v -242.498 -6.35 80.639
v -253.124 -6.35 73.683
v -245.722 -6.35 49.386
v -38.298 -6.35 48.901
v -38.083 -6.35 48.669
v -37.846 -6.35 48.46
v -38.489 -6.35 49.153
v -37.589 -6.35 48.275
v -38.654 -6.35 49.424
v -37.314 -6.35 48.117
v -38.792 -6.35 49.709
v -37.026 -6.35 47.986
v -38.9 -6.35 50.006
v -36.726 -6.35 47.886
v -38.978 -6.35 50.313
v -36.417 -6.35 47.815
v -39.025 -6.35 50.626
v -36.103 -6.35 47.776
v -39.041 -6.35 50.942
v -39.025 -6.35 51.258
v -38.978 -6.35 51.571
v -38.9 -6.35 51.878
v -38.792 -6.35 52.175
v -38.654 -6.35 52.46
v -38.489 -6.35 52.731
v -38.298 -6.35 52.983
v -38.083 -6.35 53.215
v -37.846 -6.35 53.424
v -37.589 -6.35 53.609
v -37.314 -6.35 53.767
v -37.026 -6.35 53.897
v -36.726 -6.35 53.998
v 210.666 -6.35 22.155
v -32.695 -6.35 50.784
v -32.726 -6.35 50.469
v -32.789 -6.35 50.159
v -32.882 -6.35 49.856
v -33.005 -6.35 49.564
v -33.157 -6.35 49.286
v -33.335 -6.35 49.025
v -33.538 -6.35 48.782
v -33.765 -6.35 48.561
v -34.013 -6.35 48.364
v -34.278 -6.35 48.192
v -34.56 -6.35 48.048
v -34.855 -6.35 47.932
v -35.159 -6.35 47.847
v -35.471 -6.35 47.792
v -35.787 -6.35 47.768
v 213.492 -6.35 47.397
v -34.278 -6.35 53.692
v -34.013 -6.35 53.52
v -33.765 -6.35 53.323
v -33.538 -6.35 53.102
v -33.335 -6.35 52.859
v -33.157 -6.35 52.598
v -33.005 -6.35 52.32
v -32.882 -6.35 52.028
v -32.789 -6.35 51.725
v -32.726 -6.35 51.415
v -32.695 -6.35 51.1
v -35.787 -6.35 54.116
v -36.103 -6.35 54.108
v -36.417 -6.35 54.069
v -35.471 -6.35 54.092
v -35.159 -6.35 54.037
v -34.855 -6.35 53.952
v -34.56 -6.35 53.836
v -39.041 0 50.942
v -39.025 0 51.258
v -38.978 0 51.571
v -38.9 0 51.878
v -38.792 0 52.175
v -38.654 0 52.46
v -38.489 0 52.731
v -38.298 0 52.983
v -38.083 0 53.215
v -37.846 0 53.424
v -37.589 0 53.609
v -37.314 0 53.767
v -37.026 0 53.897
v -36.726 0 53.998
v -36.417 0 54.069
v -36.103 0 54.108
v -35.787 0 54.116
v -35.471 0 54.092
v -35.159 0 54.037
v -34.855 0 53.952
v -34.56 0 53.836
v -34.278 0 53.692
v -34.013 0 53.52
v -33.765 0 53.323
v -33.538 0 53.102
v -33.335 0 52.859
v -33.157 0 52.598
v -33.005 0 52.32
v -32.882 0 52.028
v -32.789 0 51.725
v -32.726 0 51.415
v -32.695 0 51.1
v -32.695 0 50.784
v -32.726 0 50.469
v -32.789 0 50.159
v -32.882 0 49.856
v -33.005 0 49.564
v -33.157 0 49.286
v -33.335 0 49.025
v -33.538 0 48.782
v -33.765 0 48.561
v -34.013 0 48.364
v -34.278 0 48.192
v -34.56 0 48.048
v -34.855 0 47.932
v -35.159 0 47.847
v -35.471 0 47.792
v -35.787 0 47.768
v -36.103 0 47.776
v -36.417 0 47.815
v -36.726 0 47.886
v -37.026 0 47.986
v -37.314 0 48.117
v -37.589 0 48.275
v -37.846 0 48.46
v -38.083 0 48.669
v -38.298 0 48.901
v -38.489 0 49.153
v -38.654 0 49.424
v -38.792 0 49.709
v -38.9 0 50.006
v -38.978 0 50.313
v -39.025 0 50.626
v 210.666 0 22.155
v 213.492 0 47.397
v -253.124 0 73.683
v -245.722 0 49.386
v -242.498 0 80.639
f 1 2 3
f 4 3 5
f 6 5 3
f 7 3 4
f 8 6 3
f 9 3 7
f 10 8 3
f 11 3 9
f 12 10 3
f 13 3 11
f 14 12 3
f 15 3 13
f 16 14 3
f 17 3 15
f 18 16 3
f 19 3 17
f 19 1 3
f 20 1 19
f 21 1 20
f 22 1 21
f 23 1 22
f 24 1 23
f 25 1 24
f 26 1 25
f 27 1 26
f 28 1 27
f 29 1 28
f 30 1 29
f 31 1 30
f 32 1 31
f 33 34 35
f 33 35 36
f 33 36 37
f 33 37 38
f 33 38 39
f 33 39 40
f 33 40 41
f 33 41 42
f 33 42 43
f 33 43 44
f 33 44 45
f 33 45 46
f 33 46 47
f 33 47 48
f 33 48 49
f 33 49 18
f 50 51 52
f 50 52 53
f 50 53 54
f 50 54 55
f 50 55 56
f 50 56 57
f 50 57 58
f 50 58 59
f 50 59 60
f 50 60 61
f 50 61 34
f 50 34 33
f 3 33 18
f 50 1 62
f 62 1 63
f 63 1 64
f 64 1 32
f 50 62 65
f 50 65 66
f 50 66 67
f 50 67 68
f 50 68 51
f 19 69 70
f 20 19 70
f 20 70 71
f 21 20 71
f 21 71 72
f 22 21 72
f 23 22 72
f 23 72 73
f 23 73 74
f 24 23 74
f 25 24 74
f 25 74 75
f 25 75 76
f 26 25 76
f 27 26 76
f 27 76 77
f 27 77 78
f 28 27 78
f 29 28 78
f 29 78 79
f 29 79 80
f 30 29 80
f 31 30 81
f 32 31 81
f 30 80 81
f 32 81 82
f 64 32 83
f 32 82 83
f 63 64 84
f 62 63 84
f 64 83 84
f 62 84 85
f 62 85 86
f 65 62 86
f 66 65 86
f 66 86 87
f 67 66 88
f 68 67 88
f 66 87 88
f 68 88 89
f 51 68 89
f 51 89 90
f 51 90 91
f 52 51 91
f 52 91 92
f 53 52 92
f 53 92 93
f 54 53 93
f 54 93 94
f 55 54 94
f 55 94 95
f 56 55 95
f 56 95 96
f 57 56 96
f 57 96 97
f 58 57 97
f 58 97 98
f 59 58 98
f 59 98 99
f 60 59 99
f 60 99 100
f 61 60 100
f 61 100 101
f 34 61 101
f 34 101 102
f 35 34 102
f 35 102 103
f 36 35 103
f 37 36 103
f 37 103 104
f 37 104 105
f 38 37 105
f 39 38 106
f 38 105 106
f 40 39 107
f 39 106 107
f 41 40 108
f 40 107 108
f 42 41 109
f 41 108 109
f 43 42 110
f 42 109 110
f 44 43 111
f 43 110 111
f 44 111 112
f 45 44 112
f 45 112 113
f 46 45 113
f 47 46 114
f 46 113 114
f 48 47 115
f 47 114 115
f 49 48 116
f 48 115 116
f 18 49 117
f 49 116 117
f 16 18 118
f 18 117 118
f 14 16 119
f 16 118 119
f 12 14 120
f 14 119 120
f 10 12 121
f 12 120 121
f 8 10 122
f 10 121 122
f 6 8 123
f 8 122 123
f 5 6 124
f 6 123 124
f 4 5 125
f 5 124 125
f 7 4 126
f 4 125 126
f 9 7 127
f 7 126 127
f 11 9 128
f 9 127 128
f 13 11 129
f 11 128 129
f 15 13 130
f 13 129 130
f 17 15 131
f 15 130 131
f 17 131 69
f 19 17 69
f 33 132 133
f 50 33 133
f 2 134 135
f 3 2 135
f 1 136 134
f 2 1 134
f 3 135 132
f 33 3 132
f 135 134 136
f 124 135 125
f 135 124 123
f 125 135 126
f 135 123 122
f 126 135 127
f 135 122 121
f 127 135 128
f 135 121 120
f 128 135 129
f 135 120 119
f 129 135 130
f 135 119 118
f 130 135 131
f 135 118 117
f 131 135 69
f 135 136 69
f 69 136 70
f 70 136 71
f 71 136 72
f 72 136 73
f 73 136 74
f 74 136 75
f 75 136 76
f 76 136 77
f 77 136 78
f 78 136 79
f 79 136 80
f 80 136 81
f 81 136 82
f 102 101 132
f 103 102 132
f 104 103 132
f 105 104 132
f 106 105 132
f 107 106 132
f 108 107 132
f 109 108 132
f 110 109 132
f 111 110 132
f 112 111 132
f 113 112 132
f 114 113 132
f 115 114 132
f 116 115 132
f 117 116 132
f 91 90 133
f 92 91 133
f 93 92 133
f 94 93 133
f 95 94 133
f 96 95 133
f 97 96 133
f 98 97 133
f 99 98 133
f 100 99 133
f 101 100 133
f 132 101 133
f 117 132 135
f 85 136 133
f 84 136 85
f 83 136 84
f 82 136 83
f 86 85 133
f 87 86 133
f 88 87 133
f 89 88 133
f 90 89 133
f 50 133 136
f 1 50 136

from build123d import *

# Parameters (mm, degrees)
F1_DEPTH = 6.35
F3_D     = 6.35


# Not quite as in the source:
# - a length typed as a fraction of an inch, garbled in the dataset ("3 / 203.2 mm" for 3/8 in), is restored


with BuildPart() as f1:
    # F0 (on Front) → F1 (new body)
    with BuildSketch(Plane.XZ):
        Polygon((-242.4979480523, 80.6390420482), (-253.1238703477, 73.6834848906), (-245.7222477886, 49.3858310226), (210.6660933021, 22.1549273185), (213.4919888436, 47.3972393043), align=None)
    extrude(amount=F1_DEPTH)

    # F3 (through all)
    with Locations(Plane.XZ.offset(6.35)):
        with Locations((-35.8659252524, 50.9419701993)):
            Hole(F3_D / 2)


solid = f1.part
